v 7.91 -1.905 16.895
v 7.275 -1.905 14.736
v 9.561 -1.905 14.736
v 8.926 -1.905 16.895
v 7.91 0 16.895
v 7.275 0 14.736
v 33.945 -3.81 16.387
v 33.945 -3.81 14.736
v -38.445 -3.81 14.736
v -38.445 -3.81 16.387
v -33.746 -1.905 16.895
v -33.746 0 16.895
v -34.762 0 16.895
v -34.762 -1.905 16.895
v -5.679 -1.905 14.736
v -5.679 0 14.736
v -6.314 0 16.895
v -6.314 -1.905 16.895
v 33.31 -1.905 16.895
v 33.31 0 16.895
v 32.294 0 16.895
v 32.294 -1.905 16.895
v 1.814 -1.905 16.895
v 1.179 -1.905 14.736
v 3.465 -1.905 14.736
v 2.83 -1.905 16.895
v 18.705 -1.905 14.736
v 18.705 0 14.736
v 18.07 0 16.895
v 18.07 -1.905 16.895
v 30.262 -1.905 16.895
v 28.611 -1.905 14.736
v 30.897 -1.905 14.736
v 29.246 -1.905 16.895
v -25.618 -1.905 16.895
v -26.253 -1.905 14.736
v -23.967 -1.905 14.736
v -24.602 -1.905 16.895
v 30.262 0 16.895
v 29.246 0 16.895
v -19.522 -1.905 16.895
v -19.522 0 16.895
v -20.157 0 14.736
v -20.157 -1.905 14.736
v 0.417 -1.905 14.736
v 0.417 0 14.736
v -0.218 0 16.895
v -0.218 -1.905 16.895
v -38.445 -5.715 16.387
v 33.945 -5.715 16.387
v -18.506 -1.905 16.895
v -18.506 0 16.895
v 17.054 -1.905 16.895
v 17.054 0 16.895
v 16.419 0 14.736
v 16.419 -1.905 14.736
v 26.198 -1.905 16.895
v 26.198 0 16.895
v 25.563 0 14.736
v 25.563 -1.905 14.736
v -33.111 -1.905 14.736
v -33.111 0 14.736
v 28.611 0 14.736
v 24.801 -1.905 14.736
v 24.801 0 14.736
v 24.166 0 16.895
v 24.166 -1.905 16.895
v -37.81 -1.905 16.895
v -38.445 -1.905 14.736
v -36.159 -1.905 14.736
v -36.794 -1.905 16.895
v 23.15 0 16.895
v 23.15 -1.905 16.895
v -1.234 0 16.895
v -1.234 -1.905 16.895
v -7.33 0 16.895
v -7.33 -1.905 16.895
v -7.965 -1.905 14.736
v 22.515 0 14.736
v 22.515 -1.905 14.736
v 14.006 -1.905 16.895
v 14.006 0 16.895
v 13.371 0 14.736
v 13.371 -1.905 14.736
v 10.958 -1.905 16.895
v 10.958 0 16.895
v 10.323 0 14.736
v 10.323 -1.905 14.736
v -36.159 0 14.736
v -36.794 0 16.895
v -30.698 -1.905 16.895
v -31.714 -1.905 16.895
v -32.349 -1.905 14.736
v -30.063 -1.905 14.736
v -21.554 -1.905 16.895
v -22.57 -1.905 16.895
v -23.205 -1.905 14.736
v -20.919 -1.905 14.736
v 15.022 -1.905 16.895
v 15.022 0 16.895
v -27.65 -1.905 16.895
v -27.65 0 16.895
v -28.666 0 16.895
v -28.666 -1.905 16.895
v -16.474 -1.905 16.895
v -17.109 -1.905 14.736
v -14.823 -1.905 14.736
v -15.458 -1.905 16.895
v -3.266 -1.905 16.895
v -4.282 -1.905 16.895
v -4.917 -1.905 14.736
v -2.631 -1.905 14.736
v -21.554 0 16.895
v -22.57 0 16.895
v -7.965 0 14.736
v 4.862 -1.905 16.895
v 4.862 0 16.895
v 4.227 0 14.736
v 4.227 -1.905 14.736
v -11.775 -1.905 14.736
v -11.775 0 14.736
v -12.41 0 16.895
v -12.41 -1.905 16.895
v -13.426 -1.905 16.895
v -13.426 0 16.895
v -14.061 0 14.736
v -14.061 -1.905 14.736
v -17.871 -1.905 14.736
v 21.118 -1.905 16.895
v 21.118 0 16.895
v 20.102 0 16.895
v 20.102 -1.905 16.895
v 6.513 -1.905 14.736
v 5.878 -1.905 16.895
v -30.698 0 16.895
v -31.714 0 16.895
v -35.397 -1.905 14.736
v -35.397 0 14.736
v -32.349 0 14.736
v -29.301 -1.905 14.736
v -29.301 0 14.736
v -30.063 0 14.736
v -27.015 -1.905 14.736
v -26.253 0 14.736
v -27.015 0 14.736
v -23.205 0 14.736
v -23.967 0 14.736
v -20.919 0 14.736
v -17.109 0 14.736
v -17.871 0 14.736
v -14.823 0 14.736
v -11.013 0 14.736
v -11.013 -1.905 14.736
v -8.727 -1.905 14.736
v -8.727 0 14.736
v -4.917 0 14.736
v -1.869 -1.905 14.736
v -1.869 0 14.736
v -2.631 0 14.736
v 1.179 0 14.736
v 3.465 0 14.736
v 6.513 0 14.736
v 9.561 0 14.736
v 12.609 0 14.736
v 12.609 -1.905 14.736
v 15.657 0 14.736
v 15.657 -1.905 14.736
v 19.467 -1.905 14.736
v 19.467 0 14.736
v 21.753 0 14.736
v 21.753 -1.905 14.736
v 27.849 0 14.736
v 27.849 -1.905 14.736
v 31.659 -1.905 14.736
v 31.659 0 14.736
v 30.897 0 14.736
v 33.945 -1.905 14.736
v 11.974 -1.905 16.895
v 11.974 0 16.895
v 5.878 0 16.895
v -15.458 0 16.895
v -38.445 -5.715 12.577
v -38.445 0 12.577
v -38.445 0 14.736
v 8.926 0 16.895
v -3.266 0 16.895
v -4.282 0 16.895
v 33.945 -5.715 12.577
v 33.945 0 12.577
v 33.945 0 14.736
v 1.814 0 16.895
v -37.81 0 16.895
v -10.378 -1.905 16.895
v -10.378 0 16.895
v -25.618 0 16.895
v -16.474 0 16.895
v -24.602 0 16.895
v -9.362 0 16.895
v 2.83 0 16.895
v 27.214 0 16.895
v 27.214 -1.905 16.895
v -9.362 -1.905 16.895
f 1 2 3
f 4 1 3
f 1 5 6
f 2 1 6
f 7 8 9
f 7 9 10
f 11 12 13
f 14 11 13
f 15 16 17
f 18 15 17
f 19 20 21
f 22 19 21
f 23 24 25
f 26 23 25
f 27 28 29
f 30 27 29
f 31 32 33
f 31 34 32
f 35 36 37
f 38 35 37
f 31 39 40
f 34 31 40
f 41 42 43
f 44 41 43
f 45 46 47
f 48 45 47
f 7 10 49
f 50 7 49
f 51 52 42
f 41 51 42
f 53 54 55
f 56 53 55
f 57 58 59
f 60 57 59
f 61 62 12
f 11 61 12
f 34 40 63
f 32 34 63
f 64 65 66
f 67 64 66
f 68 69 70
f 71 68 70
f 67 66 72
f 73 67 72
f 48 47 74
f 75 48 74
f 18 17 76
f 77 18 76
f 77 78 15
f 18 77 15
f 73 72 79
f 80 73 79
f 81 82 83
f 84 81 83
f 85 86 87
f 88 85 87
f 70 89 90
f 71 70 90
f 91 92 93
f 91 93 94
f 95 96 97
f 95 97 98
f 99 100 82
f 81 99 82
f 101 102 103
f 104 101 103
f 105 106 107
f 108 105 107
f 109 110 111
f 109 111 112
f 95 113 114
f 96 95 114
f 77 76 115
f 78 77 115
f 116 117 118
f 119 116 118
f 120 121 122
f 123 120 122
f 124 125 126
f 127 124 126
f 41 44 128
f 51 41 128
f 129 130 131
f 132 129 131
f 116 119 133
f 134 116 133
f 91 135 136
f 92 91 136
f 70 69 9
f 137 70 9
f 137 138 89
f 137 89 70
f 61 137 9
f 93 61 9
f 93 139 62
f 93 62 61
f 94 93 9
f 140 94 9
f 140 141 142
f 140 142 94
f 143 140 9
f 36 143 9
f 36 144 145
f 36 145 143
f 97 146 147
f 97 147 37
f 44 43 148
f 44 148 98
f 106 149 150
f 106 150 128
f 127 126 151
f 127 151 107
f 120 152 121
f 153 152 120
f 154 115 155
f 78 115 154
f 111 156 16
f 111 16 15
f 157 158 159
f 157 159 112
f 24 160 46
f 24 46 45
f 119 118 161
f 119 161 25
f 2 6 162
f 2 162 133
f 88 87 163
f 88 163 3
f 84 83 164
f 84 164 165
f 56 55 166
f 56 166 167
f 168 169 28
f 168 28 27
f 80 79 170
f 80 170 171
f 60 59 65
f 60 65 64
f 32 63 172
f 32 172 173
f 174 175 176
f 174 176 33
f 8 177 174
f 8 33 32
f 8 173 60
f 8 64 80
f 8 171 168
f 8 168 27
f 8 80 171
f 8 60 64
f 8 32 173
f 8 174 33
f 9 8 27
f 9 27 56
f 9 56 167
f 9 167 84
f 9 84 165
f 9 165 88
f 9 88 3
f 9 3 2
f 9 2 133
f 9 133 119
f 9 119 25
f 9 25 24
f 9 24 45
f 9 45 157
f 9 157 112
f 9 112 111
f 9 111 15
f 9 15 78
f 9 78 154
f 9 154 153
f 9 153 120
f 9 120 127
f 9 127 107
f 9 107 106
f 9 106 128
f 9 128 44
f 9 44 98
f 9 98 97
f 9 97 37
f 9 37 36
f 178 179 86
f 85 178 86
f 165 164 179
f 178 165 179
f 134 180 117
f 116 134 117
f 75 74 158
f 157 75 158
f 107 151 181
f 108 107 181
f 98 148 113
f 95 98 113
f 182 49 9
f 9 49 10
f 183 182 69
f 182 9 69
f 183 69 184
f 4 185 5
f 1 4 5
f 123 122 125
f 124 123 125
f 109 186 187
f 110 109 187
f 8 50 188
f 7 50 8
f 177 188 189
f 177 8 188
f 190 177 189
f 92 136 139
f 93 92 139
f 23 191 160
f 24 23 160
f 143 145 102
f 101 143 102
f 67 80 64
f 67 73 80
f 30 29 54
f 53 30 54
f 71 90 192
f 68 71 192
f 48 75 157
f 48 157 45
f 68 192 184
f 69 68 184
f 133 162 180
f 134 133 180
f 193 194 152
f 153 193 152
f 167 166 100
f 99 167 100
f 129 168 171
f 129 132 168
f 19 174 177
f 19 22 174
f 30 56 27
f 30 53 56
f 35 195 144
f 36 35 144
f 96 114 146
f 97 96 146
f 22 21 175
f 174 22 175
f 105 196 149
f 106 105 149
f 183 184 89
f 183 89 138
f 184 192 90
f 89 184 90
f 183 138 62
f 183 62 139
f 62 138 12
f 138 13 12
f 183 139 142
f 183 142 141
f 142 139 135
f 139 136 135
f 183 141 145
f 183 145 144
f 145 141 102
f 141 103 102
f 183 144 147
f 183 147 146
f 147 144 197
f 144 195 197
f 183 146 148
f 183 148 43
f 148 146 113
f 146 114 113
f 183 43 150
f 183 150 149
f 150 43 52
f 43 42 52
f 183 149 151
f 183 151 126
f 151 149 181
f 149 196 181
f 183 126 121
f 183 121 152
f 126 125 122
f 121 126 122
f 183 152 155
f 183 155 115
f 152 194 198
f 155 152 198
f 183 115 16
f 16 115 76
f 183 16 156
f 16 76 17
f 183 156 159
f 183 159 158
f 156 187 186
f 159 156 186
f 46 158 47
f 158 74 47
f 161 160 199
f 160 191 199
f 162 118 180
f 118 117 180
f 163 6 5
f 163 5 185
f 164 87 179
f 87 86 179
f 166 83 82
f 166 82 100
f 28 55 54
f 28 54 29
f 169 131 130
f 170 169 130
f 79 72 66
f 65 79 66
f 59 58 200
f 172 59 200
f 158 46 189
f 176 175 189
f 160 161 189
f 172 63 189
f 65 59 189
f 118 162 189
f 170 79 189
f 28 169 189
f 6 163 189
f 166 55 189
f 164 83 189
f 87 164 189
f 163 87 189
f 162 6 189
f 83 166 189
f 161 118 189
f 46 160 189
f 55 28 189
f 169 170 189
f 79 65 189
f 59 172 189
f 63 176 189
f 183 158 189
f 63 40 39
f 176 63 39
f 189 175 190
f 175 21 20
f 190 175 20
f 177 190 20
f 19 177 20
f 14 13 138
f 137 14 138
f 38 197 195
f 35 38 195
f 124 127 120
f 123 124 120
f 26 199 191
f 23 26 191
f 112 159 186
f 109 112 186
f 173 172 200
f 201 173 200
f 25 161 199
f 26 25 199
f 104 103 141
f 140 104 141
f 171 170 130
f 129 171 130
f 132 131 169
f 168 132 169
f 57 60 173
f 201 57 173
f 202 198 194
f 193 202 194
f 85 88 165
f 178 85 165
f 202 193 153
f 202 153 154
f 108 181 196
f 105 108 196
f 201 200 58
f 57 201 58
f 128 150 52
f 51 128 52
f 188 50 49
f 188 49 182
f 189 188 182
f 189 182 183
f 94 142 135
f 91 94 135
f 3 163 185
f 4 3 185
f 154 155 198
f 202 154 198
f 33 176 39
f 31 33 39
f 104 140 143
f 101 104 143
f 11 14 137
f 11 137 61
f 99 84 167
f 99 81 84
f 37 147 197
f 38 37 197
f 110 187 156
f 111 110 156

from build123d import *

# Parameters (mm, degrees)
F1_DEPTH = 3.81
F4_DEPTH = 144.78
F5_SCALE = 0.5


with BuildPart() as f1:
    # F0 (on Front) → F1 (new body)
    with BuildSketch(Plane.XZ):
        Polygon((-37.1748663006, 21.2125933835), (-38.4448663006, 16.8945933835), (-33.8728663006, 16.8945933835), (-35.1428663006, 21.2125933835), align=None)
        Polygon((-33.8728663006, 16.8945933835), (-38.4448663006, 16.8945933835), (-38.4448663006, 12.5765933835), (106.3351336994, 12.5765933835), (106.3351336994, 16.8945933835), (101.7631336994, 16.8945933835), (100.2391336994, 16.8945933835), (95.6671336994, 16.8945933835), (94.1431336994, 16.8945933835), (89.5711336994, 16.8945933835), (88.0471336994, 16.8945933835), (83.4751336994, 16.8945933835), (81.9511336994, 16.8945933835), (77.3791336994, 16.8945933835), (75.8551336994, 16.8945933835), (71.2831336994, 16.8945933835), (69.7591336994, 16.8945933835), (65.1871336994, 16.8945933835), (63.6631336994, 16.8945933835), (59.0911336994, 16.8945933835), (57.5671336994, 16.8945933835), (52.9951336994, 16.8945933835), (51.4711336994, 16.8945933835), (46.8991336994, 16.8945933835), (45.3751336994, 16.8945933835), (40.8031336994, 16.8945933835), (39.2791336994, 16.8945933835), (34.7071336994, 16.8945933835), (33.1831336994, 16.8945933835), (28.6111336994, 16.8945933835), (27.0871336994, 16.8945933835), (22.5151336994, 16.8945933835), (20.9911336994, 16.8945933835), (16.4191336994, 16.8945933835), (14.8951336994, 16.8945933835), (10.3231336994, 16.8945933835), (8.7991336994, 16.8945933835), (4.2271336994, 16.8945933835), (2.7031336994, 16.8945933835), (-1.8688663006, 16.8945933835), (-3.3928663006, 16.8945933835), (-7.9648663006, 16.8945933835), (-9.4888663006, 16.8945933835), (-14.0608663006, 16.8945933835), (-15.5848663006, 16.8945933835), (-20.1568663006, 16.8945933835), (-21.6808663006, 16.8945933835), (-26.2528663006, 16.8945933835), (-27.7768663006, 16.8945933835), (-32.3488663006, 16.8945933835), align=None)
        Polygon((-31.0788663006, 21.2125933835), (-32.3488663006, 16.8945933835), (-27.7768663006, 16.8945933835), (-29.0468663006, 21.2125933835), align=None)
        Polygon((101.7631336994, 16.8945933835), (106.3351336994, 16.8945933835), (105.0651336994, 21.2125933835), (103.0331336994, 21.2125933835), align=None)
        Polygon((-24.9828663006, 21.2125933835), (-26.2528663006, 16.8945933835), (-21.6808663006, 16.8945933835), (-22.9508663006, 21.2125933835), align=None)
        Polygon((95.6671336994, 16.8945933835), (100.2391336994, 16.8945933835), (98.9691336994, 21.2125933835), (96.9371336994, 21.2125933835), align=None)
        Polygon((-18.8868663006, 21.2125933835), (-20.1568663006, 16.8945933835), (-15.5848663006, 16.8945933835), (-16.8548663006, 21.2125933835), align=None)
        Polygon((89.5711336994, 16.8945933835), (94.1431336994, 16.8945933835), (92.8731336994, 21.2125933835), (90.8411336994, 21.2125933835), align=None)
        Polygon((-12.7908663006, 21.2125933835), (-14.0608663006, 16.8945933835), (-9.4888663006, 16.8945933835), (-10.7588663006, 21.2125933835), align=None)
        Polygon((83.4751336994, 16.8945933835), (88.0471336994, 16.8945933835), (86.7771336994, 21.2125933835), (84.7451336994, 21.2125933835), align=None)
        Polygon((-6.6948663006, 21.2125933835), (-7.9648663006, 16.8945933835), (-3.3928663006, 16.8945933835), (-4.6628663006, 21.2125933835), align=None)
        Polygon((77.3791336994, 16.8945933835), (81.9511336994, 16.8945933835), (80.6811336994, 21.2125933835), (78.6491336994, 21.2125933835), align=None)
        Polygon((-0.5988663006, 21.2125933835), (-1.8688663006, 16.8945933835), (2.7031336994, 16.8945933835), (1.4331336994, 21.2125933835), align=None)
        Polygon((71.2831336994, 16.8945933835), (75.8551336994, 16.8945933835), (74.5851336994, 21.2125933835), (72.5531336994, 21.2125933835), align=None)
        Polygon((5.4971336994, 21.2125933835), (4.2271336994, 16.8945933835), (8.7991336994, 16.8945933835), (7.5291336994, 21.2125933835), align=None)
        Polygon((65.1871336994, 16.8945933835), (69.7591336994, 16.8945933835), (68.4891336994, 21.2125933835), (66.4571336994, 21.2125933835), align=None)
        Polygon((11.5931336994, 21.2125933835), (10.3231336994, 16.8945933835), (14.8951336994, 16.8945933835), (13.6251336994, 21.2125933835), align=None)
        Polygon((59.0911336994, 16.8945933835), (63.6631336994, 16.8945933835), (62.3931336994, 21.2125933835), (60.3611336994, 21.2125933835), align=None)
        Polygon((17.6891336994, 21.2125933835), (16.4191336994, 16.8945933835), (20.9911336994, 16.8945933835), (19.7211336994, 21.2125933835), align=None)
        Polygon((52.9951336994, 16.8945933835), (57.5671336994, 16.8945933835), (56.2971336994, 21.2125933835), (54.2651336994, 21.2125933835), align=None)
        Polygon((23.7851336994, 21.2125933835), (22.5151336994, 16.8945933835), (27.0871336994, 16.8945933835), (25.8171336994, 21.2125933835), align=None)
        Polygon((46.8991336994, 16.8945933835), (51.4711336994, 16.8945933835), (50.2011336994, 21.2125933835), (48.1691336994, 21.2125933835), align=None)
        Polygon((29.8811336994, 21.2125933835), (28.6111336994, 16.8945933835), (33.1831336994, 16.8945933835), (31.9131336994, 21.2125933835), align=None)
        Polygon((40.8031336994, 16.8945933835), (45.3751336994, 16.8945933835), (44.1051336994, 21.2125933835), (42.0731336994, 21.2125933835), align=None)
        Polygon((35.9771336994, 21.2125933835), (34.7071336994, 16.8945933835), (39.2791336994, 16.8945933835), (38.0091336994, 21.2125933835), align=None)
    extrude(amount=F1_DEPTH)

    # F3 (on plane+point) → F4 (join, through all)
    with BuildSketch(Plane.YZ.offset(106.3351336994)):
        Polygon((-11.43, 20.1965933835), (-11.43, 16.3865933835), (-11.43, 12.5765933835), (-3.81, 12.5765933835), (-3.81, 16.8945933835), (-7.62, 16.8945933835), (-7.62, 20.1965933835), align=None)
    extrude(amount=-F4_DEPTH)


with BuildPart() as f1_1:
    # F5: moved
    add(f1.part.scale(F5_SCALE).moved(Location((-19.2224331503, 0, 6.2882966917))))


solid = f1_1.part
